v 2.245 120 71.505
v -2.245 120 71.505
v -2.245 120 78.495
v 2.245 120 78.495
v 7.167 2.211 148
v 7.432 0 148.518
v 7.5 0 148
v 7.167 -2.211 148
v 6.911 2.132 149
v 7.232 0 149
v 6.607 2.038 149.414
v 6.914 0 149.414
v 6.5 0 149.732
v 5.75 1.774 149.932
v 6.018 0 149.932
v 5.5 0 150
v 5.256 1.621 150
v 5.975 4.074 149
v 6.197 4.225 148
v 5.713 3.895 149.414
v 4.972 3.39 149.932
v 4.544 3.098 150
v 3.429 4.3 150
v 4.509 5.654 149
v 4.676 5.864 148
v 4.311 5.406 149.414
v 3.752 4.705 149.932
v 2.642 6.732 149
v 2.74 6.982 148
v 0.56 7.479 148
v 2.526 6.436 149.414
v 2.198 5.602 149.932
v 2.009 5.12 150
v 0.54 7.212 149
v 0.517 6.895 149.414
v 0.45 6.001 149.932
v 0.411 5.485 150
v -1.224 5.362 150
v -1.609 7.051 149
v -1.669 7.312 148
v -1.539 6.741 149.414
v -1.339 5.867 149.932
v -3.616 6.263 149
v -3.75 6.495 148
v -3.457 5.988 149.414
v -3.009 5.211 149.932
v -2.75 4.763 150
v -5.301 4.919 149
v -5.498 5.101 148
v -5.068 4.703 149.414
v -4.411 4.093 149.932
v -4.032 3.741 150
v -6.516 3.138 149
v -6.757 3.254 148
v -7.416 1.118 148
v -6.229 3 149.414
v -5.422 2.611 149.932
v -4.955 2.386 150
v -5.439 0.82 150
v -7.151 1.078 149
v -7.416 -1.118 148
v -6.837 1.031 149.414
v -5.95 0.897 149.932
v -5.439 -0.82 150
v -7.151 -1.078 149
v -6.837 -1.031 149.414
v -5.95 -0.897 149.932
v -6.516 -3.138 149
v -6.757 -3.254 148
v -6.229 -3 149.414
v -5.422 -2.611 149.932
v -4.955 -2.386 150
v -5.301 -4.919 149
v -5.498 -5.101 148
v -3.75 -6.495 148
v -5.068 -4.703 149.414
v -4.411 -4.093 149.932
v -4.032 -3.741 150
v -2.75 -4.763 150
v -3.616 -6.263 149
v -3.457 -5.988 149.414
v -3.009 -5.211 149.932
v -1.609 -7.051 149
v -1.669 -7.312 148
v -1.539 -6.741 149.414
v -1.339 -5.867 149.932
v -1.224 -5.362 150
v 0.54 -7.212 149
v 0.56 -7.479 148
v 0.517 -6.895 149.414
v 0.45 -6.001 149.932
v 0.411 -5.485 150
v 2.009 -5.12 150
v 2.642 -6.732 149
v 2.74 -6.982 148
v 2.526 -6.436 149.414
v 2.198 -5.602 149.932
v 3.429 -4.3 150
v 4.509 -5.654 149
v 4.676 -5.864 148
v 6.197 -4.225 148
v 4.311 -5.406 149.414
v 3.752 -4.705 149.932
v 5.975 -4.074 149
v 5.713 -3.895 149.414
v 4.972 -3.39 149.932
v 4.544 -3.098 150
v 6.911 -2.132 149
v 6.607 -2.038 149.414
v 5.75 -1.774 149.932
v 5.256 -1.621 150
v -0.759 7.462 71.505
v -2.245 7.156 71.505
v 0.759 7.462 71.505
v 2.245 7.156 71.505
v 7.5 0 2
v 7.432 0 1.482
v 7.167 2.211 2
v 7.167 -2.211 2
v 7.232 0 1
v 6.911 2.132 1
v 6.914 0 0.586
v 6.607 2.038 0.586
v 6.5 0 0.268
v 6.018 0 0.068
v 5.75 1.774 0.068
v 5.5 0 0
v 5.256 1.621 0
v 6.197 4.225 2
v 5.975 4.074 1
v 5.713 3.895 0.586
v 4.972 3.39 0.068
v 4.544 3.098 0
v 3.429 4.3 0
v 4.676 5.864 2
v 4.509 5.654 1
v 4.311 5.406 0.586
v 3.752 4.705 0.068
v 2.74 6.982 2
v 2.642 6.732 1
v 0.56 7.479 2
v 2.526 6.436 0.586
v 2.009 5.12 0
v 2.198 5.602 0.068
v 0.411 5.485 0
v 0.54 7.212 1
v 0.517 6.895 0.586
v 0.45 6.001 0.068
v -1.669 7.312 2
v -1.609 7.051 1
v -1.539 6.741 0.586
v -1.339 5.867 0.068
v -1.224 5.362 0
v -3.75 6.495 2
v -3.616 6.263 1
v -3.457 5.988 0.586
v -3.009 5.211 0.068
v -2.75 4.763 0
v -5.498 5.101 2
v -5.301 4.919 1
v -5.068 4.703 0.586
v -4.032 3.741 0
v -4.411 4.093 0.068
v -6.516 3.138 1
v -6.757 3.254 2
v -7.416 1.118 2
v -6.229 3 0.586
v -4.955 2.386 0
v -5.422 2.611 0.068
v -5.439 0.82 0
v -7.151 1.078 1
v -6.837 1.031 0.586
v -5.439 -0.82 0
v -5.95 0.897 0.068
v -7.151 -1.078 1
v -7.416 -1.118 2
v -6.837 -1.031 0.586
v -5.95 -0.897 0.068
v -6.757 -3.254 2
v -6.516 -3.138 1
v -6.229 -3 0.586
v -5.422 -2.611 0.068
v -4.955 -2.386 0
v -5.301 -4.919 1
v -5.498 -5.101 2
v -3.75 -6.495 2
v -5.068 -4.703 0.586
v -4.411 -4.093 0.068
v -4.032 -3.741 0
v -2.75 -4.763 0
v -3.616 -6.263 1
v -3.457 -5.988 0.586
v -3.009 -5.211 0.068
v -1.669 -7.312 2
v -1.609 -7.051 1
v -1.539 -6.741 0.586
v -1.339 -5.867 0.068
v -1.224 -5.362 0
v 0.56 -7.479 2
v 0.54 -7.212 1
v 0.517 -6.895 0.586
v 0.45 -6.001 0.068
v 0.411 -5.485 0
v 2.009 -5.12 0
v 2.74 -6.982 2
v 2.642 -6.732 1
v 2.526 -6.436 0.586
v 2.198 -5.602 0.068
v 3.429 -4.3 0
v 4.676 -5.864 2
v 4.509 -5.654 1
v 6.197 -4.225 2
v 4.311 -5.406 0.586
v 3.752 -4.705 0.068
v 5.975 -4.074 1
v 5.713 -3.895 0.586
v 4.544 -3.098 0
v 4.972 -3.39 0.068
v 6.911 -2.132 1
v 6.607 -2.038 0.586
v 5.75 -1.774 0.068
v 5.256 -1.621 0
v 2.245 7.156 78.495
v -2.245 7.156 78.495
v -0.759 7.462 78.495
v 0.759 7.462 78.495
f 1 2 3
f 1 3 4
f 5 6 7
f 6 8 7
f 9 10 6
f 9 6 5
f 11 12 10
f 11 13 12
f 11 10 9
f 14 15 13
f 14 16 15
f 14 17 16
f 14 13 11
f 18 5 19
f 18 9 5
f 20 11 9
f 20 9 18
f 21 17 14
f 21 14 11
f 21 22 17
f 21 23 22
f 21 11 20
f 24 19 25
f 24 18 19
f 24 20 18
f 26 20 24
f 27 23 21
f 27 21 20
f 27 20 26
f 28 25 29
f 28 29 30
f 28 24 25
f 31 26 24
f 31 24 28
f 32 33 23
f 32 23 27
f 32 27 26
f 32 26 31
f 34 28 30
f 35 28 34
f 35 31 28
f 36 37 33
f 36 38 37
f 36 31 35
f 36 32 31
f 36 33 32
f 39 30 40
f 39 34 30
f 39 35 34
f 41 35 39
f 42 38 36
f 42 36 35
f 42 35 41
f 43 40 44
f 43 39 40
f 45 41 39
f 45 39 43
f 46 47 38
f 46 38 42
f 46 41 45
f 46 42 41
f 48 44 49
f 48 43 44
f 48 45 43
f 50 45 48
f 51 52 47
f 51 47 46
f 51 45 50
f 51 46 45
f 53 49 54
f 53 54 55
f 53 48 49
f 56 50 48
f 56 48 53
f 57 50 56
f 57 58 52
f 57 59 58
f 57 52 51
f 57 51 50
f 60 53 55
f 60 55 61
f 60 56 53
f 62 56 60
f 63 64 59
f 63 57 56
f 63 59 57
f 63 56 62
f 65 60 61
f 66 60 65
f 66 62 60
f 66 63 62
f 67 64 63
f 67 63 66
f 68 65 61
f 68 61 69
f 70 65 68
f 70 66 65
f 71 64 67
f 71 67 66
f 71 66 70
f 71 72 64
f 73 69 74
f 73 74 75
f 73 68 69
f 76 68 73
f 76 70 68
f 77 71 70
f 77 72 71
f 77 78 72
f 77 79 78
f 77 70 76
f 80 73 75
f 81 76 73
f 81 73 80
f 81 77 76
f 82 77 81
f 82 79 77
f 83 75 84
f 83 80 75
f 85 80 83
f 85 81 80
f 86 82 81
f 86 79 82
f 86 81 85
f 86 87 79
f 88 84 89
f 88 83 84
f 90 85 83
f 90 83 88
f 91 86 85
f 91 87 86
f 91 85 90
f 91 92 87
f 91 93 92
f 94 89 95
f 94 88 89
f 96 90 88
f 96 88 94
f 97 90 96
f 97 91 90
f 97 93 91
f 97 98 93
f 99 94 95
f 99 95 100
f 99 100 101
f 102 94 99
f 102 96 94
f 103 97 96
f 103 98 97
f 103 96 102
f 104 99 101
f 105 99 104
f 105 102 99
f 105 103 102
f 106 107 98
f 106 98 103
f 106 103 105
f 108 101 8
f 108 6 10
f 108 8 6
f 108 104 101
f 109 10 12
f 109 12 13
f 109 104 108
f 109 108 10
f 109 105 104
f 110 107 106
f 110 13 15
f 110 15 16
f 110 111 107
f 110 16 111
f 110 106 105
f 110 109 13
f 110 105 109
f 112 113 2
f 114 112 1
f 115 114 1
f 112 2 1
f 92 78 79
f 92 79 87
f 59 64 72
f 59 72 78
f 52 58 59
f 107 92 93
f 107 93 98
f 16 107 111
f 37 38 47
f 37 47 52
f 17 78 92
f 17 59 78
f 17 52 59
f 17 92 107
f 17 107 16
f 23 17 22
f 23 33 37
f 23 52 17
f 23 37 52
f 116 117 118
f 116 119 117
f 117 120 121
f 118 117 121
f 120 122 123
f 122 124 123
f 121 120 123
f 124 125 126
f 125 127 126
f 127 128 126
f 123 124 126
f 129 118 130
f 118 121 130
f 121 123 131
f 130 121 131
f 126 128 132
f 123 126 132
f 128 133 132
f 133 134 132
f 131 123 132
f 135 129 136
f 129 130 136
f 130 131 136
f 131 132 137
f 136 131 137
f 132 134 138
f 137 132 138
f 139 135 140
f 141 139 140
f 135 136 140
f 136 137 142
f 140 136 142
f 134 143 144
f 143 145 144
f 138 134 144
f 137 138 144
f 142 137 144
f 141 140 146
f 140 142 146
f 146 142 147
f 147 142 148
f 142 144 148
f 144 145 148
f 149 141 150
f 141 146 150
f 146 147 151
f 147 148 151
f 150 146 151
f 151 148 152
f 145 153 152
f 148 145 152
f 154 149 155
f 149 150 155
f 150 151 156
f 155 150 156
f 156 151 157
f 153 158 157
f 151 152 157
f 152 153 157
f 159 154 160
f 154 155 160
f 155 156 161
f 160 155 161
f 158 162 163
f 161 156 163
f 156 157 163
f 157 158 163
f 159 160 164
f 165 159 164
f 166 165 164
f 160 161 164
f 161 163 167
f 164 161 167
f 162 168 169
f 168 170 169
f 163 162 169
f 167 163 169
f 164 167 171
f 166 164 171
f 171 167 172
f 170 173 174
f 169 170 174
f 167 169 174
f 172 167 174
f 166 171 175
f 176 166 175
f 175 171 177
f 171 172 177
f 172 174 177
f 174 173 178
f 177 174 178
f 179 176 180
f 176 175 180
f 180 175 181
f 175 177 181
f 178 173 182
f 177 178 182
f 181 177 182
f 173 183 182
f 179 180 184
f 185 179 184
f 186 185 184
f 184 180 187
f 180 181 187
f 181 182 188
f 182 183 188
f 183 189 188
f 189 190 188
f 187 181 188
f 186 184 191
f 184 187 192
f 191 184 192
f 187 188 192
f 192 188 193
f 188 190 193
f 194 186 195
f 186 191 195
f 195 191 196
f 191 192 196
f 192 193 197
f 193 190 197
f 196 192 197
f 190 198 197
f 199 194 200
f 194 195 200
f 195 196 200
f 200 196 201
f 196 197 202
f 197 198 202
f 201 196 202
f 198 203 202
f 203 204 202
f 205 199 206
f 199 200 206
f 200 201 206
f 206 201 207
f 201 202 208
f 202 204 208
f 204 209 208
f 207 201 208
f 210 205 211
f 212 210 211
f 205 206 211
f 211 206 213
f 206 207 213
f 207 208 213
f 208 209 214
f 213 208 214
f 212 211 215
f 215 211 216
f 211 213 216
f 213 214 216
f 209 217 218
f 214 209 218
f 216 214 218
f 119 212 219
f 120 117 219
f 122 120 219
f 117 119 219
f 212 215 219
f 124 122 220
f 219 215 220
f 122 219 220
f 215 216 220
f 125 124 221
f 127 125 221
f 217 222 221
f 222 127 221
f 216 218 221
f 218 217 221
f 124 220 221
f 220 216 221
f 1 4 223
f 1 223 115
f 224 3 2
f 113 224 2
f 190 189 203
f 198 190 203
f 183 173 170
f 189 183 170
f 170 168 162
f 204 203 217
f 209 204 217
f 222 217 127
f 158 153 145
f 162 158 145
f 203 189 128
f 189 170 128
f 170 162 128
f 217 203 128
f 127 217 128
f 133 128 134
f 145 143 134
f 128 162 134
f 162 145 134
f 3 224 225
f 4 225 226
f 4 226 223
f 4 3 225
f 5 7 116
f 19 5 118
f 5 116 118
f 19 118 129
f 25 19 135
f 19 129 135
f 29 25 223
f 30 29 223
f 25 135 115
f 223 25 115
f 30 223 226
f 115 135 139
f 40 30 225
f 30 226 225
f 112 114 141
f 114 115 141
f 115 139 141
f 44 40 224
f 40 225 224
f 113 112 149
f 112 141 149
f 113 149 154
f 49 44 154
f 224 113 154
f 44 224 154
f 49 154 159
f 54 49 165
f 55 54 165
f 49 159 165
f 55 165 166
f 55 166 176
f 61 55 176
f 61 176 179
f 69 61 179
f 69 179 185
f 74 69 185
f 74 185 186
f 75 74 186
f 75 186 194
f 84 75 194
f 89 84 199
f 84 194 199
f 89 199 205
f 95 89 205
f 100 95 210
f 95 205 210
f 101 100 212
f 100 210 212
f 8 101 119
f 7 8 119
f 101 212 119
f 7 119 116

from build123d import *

# Parameters (mm, degrees)
SKETCH1_R           = 7.5
BOSS_EXTRUDE1_DEPTH = 150
FILLET1_R           = 2
BOSS_EXTRUDE2_REACH = 129.5
SKETCH3_W           = 4.49
SKETCH3_H           = 6.99


with BuildPart() as part:
    # Sketch1 → Boss-Extrude1 (new body)
    with BuildSketch(Plane.XY):
        Circle(SKETCH1_R)
    extrude(amount=BOSS_EXTRUDE1_DEPTH)

    # Fillet1
    fillet1_edges = [part.edges().sort_by_distance(p)[0] for p in [
        (-7.5, 0, 0),
        (-7.5, 0, 150),
    ]]
    fillet(fillet1_edges, radius=FILLET1_R)

    # Sketch3 → Boss-Extrude2 (add, up to next)
    with BuildSketch(Plane(origin=(0, 120, 0), x_dir=(1, 0, 0), z_dir=(0, 1, 0)), mode=Mode.PRIVATE) as boss_extrude2_sk1:
        with Locations((0, -75)):
            Rectangle(SKETCH3_W, SKETCH3_H)
    boss_extrude2_tool1 = extrude(boss_extrude2_sk1.sketch, amount=-BOSS_EXTRUDE2_REACH, mode=Mode.PRIVATE) - part.part
    add(boss_extrude2_tool1.solids().sort_by_distance((0, 120, 75))[0])


solid = part.part
